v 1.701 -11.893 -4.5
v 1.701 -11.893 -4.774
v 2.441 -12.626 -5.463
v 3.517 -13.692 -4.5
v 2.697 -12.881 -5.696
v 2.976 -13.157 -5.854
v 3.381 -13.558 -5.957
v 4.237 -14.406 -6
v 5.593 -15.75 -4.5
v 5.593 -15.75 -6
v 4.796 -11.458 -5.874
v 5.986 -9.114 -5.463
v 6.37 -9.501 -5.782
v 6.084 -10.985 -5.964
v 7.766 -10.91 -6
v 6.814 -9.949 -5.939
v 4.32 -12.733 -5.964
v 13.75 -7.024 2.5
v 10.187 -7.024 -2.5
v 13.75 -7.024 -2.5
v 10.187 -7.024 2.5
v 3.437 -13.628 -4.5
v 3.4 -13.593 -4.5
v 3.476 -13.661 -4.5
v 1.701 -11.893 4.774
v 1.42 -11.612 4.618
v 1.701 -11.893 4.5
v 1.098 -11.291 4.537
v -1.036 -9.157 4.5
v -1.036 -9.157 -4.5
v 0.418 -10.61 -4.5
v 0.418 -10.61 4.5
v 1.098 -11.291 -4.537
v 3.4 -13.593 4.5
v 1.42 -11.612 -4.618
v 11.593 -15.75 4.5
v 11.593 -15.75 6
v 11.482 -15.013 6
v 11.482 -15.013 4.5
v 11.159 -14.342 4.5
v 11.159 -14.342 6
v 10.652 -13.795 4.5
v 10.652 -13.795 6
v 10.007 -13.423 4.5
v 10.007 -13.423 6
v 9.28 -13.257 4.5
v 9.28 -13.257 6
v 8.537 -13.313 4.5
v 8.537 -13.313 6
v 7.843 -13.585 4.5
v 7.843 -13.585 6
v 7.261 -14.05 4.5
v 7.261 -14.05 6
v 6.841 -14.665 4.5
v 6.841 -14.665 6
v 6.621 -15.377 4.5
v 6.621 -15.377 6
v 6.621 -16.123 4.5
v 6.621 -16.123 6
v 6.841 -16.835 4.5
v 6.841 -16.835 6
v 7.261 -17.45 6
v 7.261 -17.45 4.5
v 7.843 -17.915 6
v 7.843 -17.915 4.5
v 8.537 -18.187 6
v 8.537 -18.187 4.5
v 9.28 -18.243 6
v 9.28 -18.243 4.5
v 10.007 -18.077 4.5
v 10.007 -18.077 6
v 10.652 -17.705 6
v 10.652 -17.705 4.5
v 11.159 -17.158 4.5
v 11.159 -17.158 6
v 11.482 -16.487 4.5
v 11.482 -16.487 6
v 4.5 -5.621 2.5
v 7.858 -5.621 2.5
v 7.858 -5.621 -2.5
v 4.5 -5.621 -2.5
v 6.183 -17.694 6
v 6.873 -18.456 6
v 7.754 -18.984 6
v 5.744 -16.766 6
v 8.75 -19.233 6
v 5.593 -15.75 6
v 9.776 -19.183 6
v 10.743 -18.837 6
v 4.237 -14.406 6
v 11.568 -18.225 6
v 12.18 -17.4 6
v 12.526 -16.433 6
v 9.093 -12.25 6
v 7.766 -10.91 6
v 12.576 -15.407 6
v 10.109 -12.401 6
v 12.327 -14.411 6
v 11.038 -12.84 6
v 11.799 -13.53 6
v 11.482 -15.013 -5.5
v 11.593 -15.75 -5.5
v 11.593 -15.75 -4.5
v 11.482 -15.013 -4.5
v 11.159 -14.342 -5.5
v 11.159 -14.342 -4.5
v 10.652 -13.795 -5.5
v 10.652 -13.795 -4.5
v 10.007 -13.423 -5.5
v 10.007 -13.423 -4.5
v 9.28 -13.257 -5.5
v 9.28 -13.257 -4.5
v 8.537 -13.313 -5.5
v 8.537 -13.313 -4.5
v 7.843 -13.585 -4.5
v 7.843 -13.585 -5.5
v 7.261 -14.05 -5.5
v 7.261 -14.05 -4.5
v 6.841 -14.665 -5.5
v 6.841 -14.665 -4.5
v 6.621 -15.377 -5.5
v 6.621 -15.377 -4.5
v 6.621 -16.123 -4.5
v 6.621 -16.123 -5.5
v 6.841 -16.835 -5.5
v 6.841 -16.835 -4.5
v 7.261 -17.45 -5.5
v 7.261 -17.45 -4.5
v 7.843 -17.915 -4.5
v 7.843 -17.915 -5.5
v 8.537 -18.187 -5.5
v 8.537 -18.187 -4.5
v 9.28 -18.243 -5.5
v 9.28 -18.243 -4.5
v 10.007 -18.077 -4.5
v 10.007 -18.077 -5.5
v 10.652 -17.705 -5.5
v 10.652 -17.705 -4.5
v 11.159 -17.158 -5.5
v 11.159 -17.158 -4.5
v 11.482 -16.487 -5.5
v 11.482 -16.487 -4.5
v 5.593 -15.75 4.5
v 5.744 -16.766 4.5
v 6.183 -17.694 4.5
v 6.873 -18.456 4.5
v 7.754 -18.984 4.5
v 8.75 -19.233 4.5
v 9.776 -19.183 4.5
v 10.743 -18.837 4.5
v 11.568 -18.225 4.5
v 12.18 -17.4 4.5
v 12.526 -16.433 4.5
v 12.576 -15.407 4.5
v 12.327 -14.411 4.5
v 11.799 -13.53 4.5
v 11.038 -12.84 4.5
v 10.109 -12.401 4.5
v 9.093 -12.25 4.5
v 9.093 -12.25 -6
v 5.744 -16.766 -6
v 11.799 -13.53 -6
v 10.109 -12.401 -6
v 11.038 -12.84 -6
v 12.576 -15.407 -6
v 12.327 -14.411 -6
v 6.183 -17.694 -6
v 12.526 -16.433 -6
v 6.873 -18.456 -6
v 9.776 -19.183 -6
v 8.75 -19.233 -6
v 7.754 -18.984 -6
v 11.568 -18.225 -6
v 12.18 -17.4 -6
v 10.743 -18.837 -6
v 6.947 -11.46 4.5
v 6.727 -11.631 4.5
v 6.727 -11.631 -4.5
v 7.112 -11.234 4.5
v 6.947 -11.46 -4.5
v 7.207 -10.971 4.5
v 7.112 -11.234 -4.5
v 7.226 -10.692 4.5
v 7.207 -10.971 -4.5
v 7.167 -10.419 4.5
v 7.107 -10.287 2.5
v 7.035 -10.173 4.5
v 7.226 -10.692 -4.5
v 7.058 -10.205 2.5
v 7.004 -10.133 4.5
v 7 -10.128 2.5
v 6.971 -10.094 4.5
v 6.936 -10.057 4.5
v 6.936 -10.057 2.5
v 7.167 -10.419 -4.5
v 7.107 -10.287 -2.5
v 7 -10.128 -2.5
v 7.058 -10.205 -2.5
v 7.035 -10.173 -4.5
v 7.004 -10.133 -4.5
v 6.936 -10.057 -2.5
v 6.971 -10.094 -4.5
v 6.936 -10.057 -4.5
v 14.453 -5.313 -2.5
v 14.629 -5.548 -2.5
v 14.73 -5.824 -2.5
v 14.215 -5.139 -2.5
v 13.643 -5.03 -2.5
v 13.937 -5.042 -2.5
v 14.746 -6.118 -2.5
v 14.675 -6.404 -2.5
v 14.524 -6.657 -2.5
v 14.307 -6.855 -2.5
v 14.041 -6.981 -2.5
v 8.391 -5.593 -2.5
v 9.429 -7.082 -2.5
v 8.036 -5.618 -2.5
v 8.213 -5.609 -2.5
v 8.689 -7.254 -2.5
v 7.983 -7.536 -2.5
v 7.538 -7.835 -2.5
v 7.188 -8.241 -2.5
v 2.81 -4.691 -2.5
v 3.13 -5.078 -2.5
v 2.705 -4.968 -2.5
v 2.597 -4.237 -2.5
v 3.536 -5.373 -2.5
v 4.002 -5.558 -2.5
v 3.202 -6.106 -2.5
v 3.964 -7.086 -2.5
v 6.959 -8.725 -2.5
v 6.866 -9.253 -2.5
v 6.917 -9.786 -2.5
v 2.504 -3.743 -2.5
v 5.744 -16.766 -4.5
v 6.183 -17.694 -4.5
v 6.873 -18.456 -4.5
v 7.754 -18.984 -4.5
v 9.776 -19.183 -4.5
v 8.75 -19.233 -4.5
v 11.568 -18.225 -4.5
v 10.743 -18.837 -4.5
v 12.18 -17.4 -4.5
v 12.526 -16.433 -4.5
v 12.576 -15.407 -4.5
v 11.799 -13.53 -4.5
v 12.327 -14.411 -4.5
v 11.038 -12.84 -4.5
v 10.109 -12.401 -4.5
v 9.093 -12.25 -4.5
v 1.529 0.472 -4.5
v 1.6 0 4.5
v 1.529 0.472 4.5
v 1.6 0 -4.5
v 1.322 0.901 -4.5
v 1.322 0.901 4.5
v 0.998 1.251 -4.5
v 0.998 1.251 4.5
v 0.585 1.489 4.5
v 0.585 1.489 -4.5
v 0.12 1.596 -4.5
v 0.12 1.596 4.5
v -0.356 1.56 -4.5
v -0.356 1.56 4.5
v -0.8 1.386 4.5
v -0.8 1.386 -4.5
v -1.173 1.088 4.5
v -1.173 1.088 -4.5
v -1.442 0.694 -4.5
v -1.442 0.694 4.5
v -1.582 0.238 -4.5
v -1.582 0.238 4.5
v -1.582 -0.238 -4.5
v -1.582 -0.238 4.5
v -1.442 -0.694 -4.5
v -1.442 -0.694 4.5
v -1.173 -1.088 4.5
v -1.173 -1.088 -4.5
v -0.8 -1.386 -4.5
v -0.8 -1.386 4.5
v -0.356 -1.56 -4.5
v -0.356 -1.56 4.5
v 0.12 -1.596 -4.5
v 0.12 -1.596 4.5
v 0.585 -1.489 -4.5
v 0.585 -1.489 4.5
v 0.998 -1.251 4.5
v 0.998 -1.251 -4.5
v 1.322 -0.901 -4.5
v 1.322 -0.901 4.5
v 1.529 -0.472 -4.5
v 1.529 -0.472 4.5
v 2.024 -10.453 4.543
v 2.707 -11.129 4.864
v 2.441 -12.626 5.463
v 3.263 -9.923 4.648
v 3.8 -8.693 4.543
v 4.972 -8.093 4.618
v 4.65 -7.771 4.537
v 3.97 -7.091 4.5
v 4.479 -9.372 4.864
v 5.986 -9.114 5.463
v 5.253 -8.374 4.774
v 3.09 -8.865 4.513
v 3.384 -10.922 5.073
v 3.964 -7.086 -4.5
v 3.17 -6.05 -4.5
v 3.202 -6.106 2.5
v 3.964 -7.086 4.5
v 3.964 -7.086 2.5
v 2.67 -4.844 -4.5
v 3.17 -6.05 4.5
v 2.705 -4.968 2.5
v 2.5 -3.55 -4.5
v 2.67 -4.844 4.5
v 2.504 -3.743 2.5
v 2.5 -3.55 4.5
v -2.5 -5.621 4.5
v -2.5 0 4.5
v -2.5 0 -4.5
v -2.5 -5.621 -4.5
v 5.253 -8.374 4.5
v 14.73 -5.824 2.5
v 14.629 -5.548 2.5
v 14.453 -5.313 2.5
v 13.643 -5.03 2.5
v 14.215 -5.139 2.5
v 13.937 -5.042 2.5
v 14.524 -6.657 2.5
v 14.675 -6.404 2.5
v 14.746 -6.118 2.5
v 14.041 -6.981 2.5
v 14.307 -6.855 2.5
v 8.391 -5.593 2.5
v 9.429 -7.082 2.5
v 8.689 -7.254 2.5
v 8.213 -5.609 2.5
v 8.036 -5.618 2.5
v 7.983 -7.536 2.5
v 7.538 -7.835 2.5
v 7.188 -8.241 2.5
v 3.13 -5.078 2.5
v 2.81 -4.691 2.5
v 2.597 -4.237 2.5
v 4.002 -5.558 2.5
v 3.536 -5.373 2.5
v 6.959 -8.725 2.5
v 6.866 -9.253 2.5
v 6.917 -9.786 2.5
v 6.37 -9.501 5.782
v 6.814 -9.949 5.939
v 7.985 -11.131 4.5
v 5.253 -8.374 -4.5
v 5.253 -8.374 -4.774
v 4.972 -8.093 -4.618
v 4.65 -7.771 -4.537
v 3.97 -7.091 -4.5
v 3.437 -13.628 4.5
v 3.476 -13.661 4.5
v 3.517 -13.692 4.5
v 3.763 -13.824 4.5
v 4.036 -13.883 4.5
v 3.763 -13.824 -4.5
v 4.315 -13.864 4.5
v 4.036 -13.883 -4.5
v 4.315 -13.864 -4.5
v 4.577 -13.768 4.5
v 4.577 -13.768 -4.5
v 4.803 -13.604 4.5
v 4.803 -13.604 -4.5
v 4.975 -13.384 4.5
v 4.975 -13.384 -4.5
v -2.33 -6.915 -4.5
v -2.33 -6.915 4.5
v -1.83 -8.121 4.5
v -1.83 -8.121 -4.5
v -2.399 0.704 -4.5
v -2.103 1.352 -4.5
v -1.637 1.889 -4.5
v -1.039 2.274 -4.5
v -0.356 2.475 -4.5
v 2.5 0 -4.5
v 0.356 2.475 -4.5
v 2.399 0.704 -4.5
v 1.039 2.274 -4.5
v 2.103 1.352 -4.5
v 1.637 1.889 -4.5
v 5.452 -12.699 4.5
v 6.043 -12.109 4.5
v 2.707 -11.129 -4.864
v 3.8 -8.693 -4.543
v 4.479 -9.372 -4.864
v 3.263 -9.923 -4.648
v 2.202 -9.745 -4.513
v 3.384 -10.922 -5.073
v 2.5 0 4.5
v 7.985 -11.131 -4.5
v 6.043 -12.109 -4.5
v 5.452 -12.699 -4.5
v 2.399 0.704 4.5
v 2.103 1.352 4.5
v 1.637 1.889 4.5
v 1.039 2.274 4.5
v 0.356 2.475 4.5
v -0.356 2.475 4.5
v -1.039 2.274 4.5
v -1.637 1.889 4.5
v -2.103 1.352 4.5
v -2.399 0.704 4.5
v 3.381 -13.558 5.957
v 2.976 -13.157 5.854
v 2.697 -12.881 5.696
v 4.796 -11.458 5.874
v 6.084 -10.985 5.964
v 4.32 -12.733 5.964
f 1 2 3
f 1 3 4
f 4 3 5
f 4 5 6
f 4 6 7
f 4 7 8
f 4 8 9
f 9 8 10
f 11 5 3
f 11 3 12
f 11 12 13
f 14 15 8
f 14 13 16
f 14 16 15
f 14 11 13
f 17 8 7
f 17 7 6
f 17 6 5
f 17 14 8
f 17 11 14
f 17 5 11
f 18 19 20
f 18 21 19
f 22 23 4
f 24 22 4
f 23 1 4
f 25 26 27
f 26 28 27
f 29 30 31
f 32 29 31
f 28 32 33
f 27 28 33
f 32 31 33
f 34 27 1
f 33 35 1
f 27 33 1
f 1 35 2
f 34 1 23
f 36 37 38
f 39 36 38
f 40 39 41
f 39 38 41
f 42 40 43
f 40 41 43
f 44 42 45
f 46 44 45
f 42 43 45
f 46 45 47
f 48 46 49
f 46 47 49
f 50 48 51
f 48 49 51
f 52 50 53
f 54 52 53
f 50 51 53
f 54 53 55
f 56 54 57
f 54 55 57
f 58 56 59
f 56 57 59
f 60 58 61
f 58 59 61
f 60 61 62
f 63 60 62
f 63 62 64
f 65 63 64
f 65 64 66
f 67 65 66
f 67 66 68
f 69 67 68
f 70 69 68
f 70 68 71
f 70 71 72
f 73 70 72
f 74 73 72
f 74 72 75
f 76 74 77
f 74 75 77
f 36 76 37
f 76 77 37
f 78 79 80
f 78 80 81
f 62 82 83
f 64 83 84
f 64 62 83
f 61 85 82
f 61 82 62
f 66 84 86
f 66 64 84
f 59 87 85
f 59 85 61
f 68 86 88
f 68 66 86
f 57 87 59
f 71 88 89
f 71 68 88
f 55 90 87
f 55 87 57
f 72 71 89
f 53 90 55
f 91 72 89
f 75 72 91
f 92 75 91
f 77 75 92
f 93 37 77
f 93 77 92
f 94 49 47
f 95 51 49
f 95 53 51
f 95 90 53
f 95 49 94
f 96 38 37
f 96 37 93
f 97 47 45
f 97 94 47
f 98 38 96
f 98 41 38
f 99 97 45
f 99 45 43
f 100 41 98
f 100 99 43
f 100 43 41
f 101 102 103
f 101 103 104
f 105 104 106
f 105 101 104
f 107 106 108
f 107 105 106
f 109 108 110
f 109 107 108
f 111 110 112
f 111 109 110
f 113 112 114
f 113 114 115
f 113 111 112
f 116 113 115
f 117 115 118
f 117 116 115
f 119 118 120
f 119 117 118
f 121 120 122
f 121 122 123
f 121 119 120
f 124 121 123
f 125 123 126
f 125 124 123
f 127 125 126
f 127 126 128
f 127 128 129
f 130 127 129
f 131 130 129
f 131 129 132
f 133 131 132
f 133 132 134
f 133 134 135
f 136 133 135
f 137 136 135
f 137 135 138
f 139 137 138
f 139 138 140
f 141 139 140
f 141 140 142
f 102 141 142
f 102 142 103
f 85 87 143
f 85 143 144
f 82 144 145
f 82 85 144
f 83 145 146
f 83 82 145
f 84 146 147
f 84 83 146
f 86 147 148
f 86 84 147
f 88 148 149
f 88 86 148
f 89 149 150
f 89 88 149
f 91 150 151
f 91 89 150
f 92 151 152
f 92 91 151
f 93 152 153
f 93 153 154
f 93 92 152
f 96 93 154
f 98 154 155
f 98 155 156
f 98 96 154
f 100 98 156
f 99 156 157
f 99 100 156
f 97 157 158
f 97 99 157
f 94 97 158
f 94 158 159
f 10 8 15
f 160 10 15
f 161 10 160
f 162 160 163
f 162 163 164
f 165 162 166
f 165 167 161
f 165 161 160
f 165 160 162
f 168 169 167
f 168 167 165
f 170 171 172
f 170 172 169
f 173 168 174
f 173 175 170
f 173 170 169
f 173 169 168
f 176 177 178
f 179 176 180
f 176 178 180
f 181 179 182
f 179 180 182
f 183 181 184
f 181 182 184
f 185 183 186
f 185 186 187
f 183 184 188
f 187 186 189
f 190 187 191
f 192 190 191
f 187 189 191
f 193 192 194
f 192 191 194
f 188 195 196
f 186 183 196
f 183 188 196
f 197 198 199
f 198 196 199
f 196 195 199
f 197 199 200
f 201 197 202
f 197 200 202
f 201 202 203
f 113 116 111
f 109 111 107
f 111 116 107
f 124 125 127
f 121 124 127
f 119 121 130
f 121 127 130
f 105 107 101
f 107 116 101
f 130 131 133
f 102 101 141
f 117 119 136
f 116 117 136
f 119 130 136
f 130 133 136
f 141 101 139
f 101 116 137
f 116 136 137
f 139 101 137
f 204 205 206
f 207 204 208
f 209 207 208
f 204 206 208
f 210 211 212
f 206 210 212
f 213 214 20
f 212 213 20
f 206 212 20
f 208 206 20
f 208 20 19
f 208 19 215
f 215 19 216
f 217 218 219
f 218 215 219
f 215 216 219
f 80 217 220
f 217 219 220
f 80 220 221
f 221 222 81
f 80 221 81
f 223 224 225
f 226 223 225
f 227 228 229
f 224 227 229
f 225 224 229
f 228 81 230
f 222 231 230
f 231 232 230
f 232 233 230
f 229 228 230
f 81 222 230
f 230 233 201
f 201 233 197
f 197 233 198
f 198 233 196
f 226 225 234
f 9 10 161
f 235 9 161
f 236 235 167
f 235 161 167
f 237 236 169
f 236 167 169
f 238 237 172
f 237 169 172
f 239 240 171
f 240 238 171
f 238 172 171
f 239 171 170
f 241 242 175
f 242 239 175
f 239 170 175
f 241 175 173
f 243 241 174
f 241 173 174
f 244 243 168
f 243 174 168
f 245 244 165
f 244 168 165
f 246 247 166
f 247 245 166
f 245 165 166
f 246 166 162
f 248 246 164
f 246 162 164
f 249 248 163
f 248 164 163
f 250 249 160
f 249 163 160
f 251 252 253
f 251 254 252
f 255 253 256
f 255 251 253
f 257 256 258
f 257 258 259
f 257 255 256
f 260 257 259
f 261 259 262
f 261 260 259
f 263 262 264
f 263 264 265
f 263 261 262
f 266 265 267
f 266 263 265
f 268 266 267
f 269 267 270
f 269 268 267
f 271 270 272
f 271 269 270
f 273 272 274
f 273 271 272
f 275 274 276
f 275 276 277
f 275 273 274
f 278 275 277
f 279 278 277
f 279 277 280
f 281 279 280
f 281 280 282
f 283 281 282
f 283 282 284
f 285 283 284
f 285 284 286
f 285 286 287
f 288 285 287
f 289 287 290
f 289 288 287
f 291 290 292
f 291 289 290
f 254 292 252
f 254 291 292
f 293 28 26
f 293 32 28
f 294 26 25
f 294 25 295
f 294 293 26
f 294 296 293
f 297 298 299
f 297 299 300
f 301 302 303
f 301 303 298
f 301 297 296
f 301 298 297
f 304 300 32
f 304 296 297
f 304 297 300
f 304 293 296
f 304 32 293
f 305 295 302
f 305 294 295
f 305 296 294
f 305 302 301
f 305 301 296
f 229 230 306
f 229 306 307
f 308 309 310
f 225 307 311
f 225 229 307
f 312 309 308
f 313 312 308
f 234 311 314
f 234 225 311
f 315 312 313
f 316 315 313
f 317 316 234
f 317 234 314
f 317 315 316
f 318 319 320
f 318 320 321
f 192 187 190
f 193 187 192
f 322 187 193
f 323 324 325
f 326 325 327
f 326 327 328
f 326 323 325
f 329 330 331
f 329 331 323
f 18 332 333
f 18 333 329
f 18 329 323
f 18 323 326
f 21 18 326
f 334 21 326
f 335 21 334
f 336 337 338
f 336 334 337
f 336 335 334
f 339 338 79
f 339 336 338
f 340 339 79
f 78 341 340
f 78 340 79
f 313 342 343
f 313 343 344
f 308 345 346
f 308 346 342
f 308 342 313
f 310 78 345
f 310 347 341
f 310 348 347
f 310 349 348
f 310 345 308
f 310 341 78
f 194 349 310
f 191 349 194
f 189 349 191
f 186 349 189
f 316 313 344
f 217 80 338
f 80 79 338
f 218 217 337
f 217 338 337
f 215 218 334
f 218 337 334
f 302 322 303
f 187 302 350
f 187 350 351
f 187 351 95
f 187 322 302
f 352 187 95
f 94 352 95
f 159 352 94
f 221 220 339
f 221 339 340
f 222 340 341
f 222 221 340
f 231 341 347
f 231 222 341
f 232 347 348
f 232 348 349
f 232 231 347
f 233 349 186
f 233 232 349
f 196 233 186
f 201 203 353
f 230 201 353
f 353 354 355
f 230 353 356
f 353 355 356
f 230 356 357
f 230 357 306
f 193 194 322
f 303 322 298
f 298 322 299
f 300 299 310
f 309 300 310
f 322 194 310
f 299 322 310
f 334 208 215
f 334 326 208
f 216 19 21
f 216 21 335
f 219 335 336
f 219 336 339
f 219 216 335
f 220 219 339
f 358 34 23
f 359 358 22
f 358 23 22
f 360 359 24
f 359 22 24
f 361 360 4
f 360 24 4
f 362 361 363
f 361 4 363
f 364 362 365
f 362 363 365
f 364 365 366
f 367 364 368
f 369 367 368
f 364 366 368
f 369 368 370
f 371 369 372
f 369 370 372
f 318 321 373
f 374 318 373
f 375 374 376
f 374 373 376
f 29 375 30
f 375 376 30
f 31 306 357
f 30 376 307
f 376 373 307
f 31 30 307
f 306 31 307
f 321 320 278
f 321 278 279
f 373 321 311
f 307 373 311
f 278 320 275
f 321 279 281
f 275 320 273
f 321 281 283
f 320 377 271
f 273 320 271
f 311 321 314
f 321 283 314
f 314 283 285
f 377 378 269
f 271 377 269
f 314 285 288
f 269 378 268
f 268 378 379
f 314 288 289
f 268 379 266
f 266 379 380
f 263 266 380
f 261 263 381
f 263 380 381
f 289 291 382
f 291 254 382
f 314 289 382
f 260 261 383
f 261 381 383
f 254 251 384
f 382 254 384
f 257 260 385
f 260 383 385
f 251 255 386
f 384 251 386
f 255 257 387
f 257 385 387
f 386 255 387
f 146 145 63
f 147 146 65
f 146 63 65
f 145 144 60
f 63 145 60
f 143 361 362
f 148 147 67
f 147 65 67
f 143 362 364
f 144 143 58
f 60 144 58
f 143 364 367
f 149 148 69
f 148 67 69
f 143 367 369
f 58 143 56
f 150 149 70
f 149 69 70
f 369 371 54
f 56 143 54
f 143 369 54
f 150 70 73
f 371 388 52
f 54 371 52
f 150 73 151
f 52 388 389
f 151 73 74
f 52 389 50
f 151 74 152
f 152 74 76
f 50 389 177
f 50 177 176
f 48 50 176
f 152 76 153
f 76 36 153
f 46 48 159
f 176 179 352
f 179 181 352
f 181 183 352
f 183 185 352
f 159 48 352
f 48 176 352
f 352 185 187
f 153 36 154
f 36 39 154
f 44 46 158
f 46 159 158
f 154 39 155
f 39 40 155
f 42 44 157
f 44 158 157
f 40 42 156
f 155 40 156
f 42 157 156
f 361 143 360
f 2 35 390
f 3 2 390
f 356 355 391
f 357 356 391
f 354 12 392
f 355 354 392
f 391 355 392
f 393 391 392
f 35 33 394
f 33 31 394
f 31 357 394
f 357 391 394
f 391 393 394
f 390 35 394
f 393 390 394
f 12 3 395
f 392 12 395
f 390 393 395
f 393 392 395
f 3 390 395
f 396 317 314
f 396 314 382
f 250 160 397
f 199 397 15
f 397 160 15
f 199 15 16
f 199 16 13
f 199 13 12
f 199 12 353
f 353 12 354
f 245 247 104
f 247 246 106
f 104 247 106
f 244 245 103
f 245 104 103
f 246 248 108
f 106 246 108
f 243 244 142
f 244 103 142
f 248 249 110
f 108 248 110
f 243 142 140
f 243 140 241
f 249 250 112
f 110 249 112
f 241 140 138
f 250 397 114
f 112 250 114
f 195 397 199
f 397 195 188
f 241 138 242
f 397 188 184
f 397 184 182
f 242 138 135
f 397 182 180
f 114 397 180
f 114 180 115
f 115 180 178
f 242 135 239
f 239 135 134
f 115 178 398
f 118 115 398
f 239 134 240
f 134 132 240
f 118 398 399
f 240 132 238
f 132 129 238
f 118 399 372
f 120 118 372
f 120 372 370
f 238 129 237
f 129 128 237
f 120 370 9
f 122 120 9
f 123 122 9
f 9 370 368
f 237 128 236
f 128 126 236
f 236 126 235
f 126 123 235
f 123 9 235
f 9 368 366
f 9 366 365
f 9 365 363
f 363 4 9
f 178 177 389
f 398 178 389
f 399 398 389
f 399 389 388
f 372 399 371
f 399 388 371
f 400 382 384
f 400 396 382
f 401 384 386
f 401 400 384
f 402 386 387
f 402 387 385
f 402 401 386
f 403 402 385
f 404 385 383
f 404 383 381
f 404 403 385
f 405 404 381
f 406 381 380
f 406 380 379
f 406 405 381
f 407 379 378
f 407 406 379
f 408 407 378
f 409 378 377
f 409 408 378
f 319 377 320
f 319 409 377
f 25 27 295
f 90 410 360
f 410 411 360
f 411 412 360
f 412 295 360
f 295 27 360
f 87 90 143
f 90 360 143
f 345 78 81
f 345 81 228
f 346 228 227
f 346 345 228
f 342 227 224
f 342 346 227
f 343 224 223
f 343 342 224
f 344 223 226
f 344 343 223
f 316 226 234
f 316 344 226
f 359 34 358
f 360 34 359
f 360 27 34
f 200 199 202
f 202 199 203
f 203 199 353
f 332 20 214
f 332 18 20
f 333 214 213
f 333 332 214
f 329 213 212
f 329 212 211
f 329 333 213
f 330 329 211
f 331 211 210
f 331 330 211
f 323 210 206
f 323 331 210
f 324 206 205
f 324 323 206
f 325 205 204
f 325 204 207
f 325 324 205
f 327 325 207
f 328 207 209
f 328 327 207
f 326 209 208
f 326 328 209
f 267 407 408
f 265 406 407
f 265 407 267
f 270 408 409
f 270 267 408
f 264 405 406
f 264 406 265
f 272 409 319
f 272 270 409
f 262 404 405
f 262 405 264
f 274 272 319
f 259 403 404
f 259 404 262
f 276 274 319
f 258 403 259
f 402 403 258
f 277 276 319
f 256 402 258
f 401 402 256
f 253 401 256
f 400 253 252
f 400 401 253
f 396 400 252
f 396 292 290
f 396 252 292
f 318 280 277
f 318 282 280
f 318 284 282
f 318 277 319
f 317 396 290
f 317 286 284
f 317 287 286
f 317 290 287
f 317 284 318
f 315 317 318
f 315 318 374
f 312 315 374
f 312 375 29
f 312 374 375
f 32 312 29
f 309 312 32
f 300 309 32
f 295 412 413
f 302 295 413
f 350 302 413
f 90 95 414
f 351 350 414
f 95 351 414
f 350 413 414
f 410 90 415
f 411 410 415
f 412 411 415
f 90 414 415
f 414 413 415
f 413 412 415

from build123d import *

# Parameters (mm, degrees)
SKETCH1_R           = 1.6
SKETCH1_R_2         = 2.4999999999999964
BOSS_EXTRUDE1_DEPTH = 4.5
SKETCH3_R           = 4.750000000000001
CUT_EXTRUDE1_DEPTH  = 9
BOSS_EXTRUDE2_START = 1.5
SKETCH4_R           = 3.4999999999999996
SKETCH4_R_2         = 2.5000000000000018
BOSS_EXTRUDE2_DEPTH = 1.5
FILLET1_START       = -8.126082892
FILLET1_DEPTH       = 5.963451672
FILLET3_R           = 1
SKETCH5_R           = 2.5000000000000018
BOSS_EXTRUDE3_DEPTH = 0.5
BOSS_EXTRUDE4_DEPTH = 2.5
FILLET4_R           = 5
FILLET5_R           = 2
FILLET6_R           = 5


with BuildPart() as part:
    # Sketch1 → Boss-Extrude1 (new, symmetric)
    with BuildSketch(Plane.XY):
        with BuildLine():
            Line((-2.5, 0), (-2.499999999999999, -7.6922671661961415))
            Line((-2.499999999999999, -7.6922671661961415), (5.59344897920139, -15.785716145397497))
            ThreePointArc((5.59344897920139, -15.785716145397497), (11.568140473889555, -18.224873734152915), (9.128982885134128, -12.250182239464754))
            Line((9.128982885134128, -12.250182239464754), (2.500000000000001, -5.621199354330655))
            Line((2.500000000000001, -5.621199354330655), (2.5, 0))
            ThreePointArc((2.5, 0), (1.5e-16, 2.5), (-2.5, 0))
        make_face()
        Circle(SKETCH1_R, mode=Mode.SUBTRACT)
        with Locations((9.093266739736636, -15.75)):
            Circle(SKETCH1_R_2, mode=Mode.SUBTRACT)
    extrude(amount=BOSS_EXTRUDE1_DEPTH, both=True)

    # Sketch3 → Cut-Extrude1 (cut)
    with BuildSketch(Plane.XY.offset(4.5)):
        with Locations((9.093266739736636, -15.75)):
            Circle(SKETCH3_R)
    extrude(amount=-CUT_EXTRUDE1_DEPTH, mode=Mode.SUBTRACT)

    # Sketch4 → Boss-Extrude2 (add)
    # profile 1 of 3: a face of its own
    with BuildSketch(Plane.XY.offset(4.5).offset(BOSS_EXTRUDE2_START)):
        with BuildLine():
            ThreePointArc((4.4744473247851495, -14.641394023077986), (5.734522129252316, -12.391230189259387), (7.98469541716161, -11.131172267472593))
            Line((7.9846954171615945, -11.13117226747262), (5.252559389002018, -8.37375874333266))
            Line((5.252559389002018, -8.37375874333266), (1.700745560054771, -11.89301272625091))
            Line((1.7007455600547712, -11.89301272625091), (4.474447324785227, -14.641394023077948))
        make_face()
    # profile 2 of 3: a face of its own
    with BuildSketch(Plane.XY.offset(4.5).offset(BOSS_EXTRUDE2_START)):
        with BuildLine():
            ThreePointArc((5.593266739736636, -15.75), (6.61839300558372, -13.275126265847083), (9.093266739736636, -12.25))
            Line((9.093266739736636, -12.25), (7.9846954171615945, -11.13117226747262))
            ThreePointArc((7.98469541716161, -11.131172267472593), (5.734522129252316, -12.391230189259387), (4.4744473247851495, -14.641394023077986))
            Line((4.474447324785227, -14.641394023077948), (5.593266739736636, -15.75))
        make_face()
    # profile 3 of 3: a face of its own
    with BuildSketch(Plane.XY.offset(4.5).offset(BOSS_EXTRUDE2_START)):
        with Locations((9.093266739736636, -15.75)):
            Circle(SKETCH4_R)
        with Locations((9.093266739736636, -15.75)):
            Circle(SKETCH4_R_2, mode=Mode.SUBTRACT)
    boss_extrude2 = extrude(amount=-BOSS_EXTRUDE2_DEPTH)

    # Mirror1: Boss-Extrude2 across plane
    add(boss_extrude2.mirror(Plane.XY))

    # Fillet1: read off the stored shape, not the designer's step
    # Fillet1 outline → Fillet1 (cut)
    with BuildSketch(Plane(origin=(0, 0, 0), x_dir=(0.7038433348722607, -0.7103552350450406, 0), z_dir=(0.7103552350450406, 0.7038433348722604, 0)).offset(FILLET1_START)):
        with BuildLine():
            Line((9.645322277, 6), (9.645322277, 4.5))
            add(Edge.make_bspline(
                [(9.645322277, 4.5), (11.115616365533654, 6.000000000002685), (13.216036492, 6)],
                knots=[0, 0, 0, 1, 1, 1], degree=2, weights=[1, 2.30488611432322, 1]))
            Line((13.216036492, 6), (9.645322277, 6))
        make_face()
        with BuildLine():
            add(Edge.make_bspline(
                [(9.645322277, -4.5), (11.115616365534704, -5.999999999999404), (13.216036492, -6)],
                knots=[0, 0, 0, 1, 1, 1], degree=2, weights=[1, 2.30488611432322, 1]))
            Line((9.645322277, -4.5), (9.645322277, -6))
            Line((9.645322277, -6), (13.216036492, -6))
        make_face()
    extrude(amount=FILLET1_DEPTH, mode=Mode.SUBTRACT)

    # Fillet2
    # a fillet whose section is not a circle: 5 mm, written as the material it adds along each edge (its section moved 0.00015 mm through the faces so that the kernel can cut it)
    with BuildSketch(Plane(origin=(5.252559389002018, -8.37375874333266, -4.5), x_dir=(-0.7038433326996095, 0.7103552328501724, 7.859188268463715e-05), z_dir=(-0.7103552350439925, -0.7038433348733185, 0))) as fillet2_piece_1_section:
        with BuildLine():
            Bezier((1.9085940541919586, 0), (0.25927433920384835, -0.00012962314195013), (-1.0664365698179072, 0.9810666491436392), weights=[1, 2.3741747222401877, 1])
            Line((-1.0664365698179072, 0.9810666491436392), (-1.1259275381450011, 0.9006873938130198))
            ThreePointArc((-1.1259275381450011, 0.9006873938130198), (-0.5842679506665102, 0.43645084882092705), (-0.07140878262543363, -0.07000561237467808))
            Line((-0.07140878262543363, -0.07000561237467808), (7.85918826802e-06, -0.09999999969116545))
            ThreePointArc((7.85918826802e-06, -0.09999999969116545), (0.9543048803898561, -0.09992499969139726), (1.9086019133802261, -0.09999999969116545))
            Line((1.9086019133802261, -0.09999999969116545), (1.9085940541919586, 0))
        make_face()
    fillet2_piece_1 = extrude(amount=9.771538142377612, mode=Mode.PRIVATE)
    fillet2_piece_1 = split(fillet2_piece_1, bisect_by=Plane(origin=(5.252559389002018, -8.37375874333266, -4.5), z_dir=(-0.707106781186546, -0.707106781186549, 0)), keep=Keep.TOP, mode=Mode.PRIVATE)
    fillet2_piece_1 = split(fillet2_piece_1, bisect_by=Plane(origin=(1.7170254830692855, -11.909292649265407, -4.5), z_dir=(0.707106781186546, 0.707106781186549, 0)), keep=Keep.TOP, mode=Mode.PRIVATE)
    fillet2_piece_1 = split(fillet2_piece_1, bisect_by=Plane(origin=(1.7333853025127066, -11.925354508213672, -4.5), z_dir=(0.7038570774376808, 0.7103416181957006, 0)), keep=Keep.TOP, mode=Mode.PRIVATE)
    add(fillet2_piece_1)
    with BuildSketch(Plane(origin=(5.252559389002018, -8.37375874333266, 4.5), x_dir=(-0.7038433326996095, 0.7103552328501724, -7.85918826847737e-05), z_dir=(-0.7103552350439925, -0.7038433348733185, 0))) as fillet2_piece_2_section:
        with BuildLine():
            Bezier((1.9085940541886428, 0), (0.25927433920271037, 0.00012962314195018), (-1.0664365698180711, -0.9810666491413066), weights=[1, 2.374174722240495, 1])
            Line((-1.0664365698180711, -0.9810666491413066), (-1.125927538145101, -0.9006873938106411))
            ThreePointArc((-1.125927538145101, -0.9006873938106411), (-0.5842679506666038, -0.4364508488196), (-0.07140878262533187, 0.0700056123747811))
            Line((-0.07140878262533187, 0.0700056123747811), (7.8591882693e-06, 0.09999999969116545))
            ThreePointArc((7.8591882693e-06, 0.09999999969116545), (0.9543048803881994, 0.09992499969139726), (1.9086019133769117, 0.09999999969116545))
            Line((1.9086019133769117, 0.09999999969116545), (1.9085940541886428, 0))
        make_face()
    fillet2_piece_2 = extrude(amount=9.771538142369321, mode=Mode.PRIVATE)
    fillet2_piece_2 = split(fillet2_piece_2, bisect_by=Plane(origin=(1.7170254830692855, -11.909292649265407, 4.5), z_dir=(0.707106781186546, 0.707106781186549, 0)), keep=Keep.TOP, mode=Mode.PRIVATE)
    fillet2_piece_2 = split(fillet2_piece_2, bisect_by=Plane(origin=(5.252559389002018, -8.37375874333266, 4.5), z_dir=(-0.707106781186546, -0.707106781186549, 0)), keep=Keep.TOP, mode=Mode.PRIVATE)
    fillet2_piece_2 = split(fillet2_piece_2, bisect_by=Plane(origin=(1.7333853025127066, -11.925354508213672, 4.5), z_dir=(0.7038570774376808, 0.7103416181957006, 0)), keep=Keep.TOP, mode=Mode.PRIVATE)
    add(fillet2_piece_2)

    # Fillet3
    # the kernel refuses this fillet: 1 mm, written as the material it takes off along each edge
    with BuildSketch(Plane(origin=(4.4695848720713, -14.661852038267408, -4.5), x_dir=(0.3674872938849202, 0.9300285419454277, 0), z_dir=(0, 0, 1))) as fillet3_piece_1:
        with BuildLine():
            CenterArc((1.5189314922424455, 0.9894814011805907), FILLET3_R, 156.5607354128971, 105.12166531490846)
            Line((0.6014492460298756, 1.3872581323813222), (0, 0))
            ThreePointArc((0, 0), (0.68713567506206, 0.04996334439219424), (1.3742713501241177, -2e-17))
        make_face()
    extrude(amount=9, mode=Mode.SUBTRACT)
    with BuildSketch(Plane(origin=(8.005118778004036, -11.126318132334667, -4.5), x_dir=(-0.7071067811866694, 0.7071067811864257, 0), z_dir=(0, 0, 1))) as fillet3_piece_2:
        with BuildLine():
            CenterArc((1.512027222443001, 1.0000000000000007), FILLET3_R, 164.87833468508381, 105.1216653149063)
            ThreePointArc((0.5466531654354455, 1.2608695652175128), (0.3191670641589702, 0.6105605267965641), (0, 0))
            Line((0, 0), (1.5120272224428286, 4e-17))
        make_face()
    extrude(amount=9, mode=Mode.SUBTRACT)

    # Sketch5 → Boss-Extrude3 (add)
    with BuildSketch(Plane(origin=(0, 0, -6), x_dir=(-1, 0, 0), z_dir=(0, 0, -1))):
        with Locations(Location((-9.093266739736636, -15.75, 0), (0, 0, 180))):
            Circle(SKETCH5_R)
    extrude(amount=-BOSS_EXTRUDE3_DEPTH)

    # Sketch7 → Boss-Extrude4 (add, symmetric)
    with BuildSketch(Plane.XY):
        with BuildLine():
            ThreePointArc((12.834784737336257, -5.621199354330662), (12.912454393011577, -6.570532060599576), (13.749999999999998, -7.024164641901866))
            Line((13.749999999999998, -7.024164641901864), (13.75, -5.621199354330655))
            Line((13.75, -5.621199354330655), (12.834784737336253, -5.621199354330655))
        make_face()
        with BuildLine():
            Line((13.75, -5.621199354330655), (13.749999999999998, -7.024164641901864))
            ThreePointArc((13.749999999999998, -7.024164641901866), (14.457106781186546, -6.731271423088413), (14.75, -6.024164641901864))
            ThreePointArc((14.75, -6.024164641901864), (14.418375906356768, -5.280340974759061), (13.643452704396466, -5.029857006509489))
            ThreePointArc((13.643452704396466, -5.029857006509489), (13.159727923368479, -5.216960283917396), (12.834784737336257, -5.621199354330662))
            Line((12.834784737336253, -5.621199354330655), (13.75, -5.621199354330655))
        make_face()
        with BuildLine():
            Line((6.614639823149787, -7.024164641901864), (8.129576761852361, -7.024164641901864))
            Line((8.129576761852361, -7.024164641901864), (13.75, -7.024164641901864))
            ThreePointArc((13.749999999999998, -7.024164641901866), (12.912454393011577, -6.570532060599576), (12.834784737336257, -5.621199354330662))
            Line((12.834784737336253, -5.621199354330655), (8.125, -5.621199354330655))
            Line((8.125, -5.621199354330655), (2.500000000000001, -5.621199354330655))
            Line((2.500000000000001, -5.621199354330655), (3.9029652875712157, -7.024164641901864))
            Line((3.9029652875712157, -7.024164641901864), (6.614639823149787, -7.024164641901864))
        make_face()
        Polygon((5.252559389002302, -8.373758743332944), (6.0030522403921855, -9.13119509235208), (8.129576761852361, -7.024164641901864), (6.614639823149787, -7.024164641901864), align=None)
        Polygon((3.9029652875712157, -7.024164641901864), (5.252559389002302, -8.373758743332944), (6.614639823149787, -7.024164641901864), align=None)
        with BuildLine():
            Line((8.125, -5.621199354330655), (12.834784737336253, -5.621199354330655))
            ThreePointArc((12.834784737336257, -5.621199354330662), (13.159727923368479, -5.216960283917396), (13.643452704396466, -5.029857006509489))
            Line((13.643452704396466, -5.0298570065094905), (8.125, -5.621199354330655))
        make_face()
    extrude(amount=BOSS_EXTRUDE4_DEPTH, both=True)

    # Fillet4
    fillet4_edges = [part.edges().sort_by_distance(p)[0] for p in [
        (8.125, -5.621199354330655, 0),
        (8.129576761852361, -7.024164641901864, 0),
    ]]
    fillet(fillet4_edges, radius=FILLET4_R)

    # Fillet5
    # the kernel refuses this fillet: 2 mm, written as the material it adds along each edge
    with BuildSketch(Plane(origin=(6.006539975421141, -9.12773932975214, -2.5), x_dir=(0.6887204470321209, -0.7250269966283157, 0), z_dir=(0, 0, 1))) as fillet5_piece_1:
        with BuildLine():
            CenterArc((2.11607805444544, 1.9318531703443815), FILLET5_R, 162.6302604591367, 92.36990753869333)
            Line((0.20728179001408314, 2.5289267176506547), (0.0164021635709476, 2.5886340723812813))
            ThreePointArc((0.0164021635709476, 2.5886340723812813), (-0.21957324686099225, 0.9266827798096786), (-0.19995560376753524, -0.00421384882979087))
            Line((-0.19995560376753524, -0.00421384882979087), (0.005134521484191, -0.19993408085948786))
            ThreePointArc((0.005134521484191, -0.19993408085948786), (1.319091329821553, -0.16619026173425153), (1.5466823860752452, -0.19318531703443798))
            Line((1.5466823860752452, -0.19318531703443798), (1.5984456286543542, -7e-17))
        make_face()
    extrude(amount=5)
    with BuildSketch(Plane(origin=(2.500000000000001, -5.621199354330655, 2.5), x_dir=(1, 0, 0), z_dir=(0, 0, -1))) as fillet5_piece_2:
        with BuildLine():
            CenterArc((FILLET5_R, -FILLET5_R), FILLET5_R, 90, 90)
            Line((-8.9e-16, -FILLET5_R), (0, 0))
            Line((0, 0), (FILLET5_R, 0))
        make_face()
    extrude(amount=5)

    # Fillet6
    # the kernel refuses this fillet: 5 mm, written as the material it adds along each edge
    with BuildSketch(Plane(origin=(2.500000000000001, -5.621199354330655, 4.5), x_dir=(-4.3e-16, 1, 0), z_dir=(0, 0, -1)), Plane(origin=(2.500000000000001, -5.621199354330655, 2.677669529663687), x_dir=(-4.3e-16, 1, 0), z_dir=(0, 0, -1))) as fillet6_piece_1:
        with BuildLine():
            CenterArc((FILLET6_R * 0.414213562373, FILLET6_R), FILLET6_R, 225.00000000000003, 45)
            Line((-FILLET6_R * 0.292893218813, FILLET6_R * 0.292893218813), (0, 0))
            Line((0, 0), (FILLET6_R * 0.414213562373, 0))
        make_face()
    extrude(amount=7.177669529663687)
    # the kernel refuses this fillet: 5 mm, written as the material it takes off along each edge
    with BuildSketch(Plane(origin=(-2.499999999999999, -7.6922671661961415, -9.677669529663689), x_dir=(-2.1e-16, 1, 0), z_dir=(0, 0, 1))) as fillet6_2_piece_1:
        with BuildLine():
            CenterArc((FILLET6_R * 0.414213562373, -FILLET6_R), FILLET6_R, 90, 45)
            Line((-FILLET6_R * 0.292893218813, -FILLET6_R * 0.292893218813), (0, 0))
            Line((0, 0), (FILLET6_R * 0.414213562373, 0))
        make_face()
    extrude(amount=19.355339059327378, mode=Mode.SUBTRACT)


solid = part.part
